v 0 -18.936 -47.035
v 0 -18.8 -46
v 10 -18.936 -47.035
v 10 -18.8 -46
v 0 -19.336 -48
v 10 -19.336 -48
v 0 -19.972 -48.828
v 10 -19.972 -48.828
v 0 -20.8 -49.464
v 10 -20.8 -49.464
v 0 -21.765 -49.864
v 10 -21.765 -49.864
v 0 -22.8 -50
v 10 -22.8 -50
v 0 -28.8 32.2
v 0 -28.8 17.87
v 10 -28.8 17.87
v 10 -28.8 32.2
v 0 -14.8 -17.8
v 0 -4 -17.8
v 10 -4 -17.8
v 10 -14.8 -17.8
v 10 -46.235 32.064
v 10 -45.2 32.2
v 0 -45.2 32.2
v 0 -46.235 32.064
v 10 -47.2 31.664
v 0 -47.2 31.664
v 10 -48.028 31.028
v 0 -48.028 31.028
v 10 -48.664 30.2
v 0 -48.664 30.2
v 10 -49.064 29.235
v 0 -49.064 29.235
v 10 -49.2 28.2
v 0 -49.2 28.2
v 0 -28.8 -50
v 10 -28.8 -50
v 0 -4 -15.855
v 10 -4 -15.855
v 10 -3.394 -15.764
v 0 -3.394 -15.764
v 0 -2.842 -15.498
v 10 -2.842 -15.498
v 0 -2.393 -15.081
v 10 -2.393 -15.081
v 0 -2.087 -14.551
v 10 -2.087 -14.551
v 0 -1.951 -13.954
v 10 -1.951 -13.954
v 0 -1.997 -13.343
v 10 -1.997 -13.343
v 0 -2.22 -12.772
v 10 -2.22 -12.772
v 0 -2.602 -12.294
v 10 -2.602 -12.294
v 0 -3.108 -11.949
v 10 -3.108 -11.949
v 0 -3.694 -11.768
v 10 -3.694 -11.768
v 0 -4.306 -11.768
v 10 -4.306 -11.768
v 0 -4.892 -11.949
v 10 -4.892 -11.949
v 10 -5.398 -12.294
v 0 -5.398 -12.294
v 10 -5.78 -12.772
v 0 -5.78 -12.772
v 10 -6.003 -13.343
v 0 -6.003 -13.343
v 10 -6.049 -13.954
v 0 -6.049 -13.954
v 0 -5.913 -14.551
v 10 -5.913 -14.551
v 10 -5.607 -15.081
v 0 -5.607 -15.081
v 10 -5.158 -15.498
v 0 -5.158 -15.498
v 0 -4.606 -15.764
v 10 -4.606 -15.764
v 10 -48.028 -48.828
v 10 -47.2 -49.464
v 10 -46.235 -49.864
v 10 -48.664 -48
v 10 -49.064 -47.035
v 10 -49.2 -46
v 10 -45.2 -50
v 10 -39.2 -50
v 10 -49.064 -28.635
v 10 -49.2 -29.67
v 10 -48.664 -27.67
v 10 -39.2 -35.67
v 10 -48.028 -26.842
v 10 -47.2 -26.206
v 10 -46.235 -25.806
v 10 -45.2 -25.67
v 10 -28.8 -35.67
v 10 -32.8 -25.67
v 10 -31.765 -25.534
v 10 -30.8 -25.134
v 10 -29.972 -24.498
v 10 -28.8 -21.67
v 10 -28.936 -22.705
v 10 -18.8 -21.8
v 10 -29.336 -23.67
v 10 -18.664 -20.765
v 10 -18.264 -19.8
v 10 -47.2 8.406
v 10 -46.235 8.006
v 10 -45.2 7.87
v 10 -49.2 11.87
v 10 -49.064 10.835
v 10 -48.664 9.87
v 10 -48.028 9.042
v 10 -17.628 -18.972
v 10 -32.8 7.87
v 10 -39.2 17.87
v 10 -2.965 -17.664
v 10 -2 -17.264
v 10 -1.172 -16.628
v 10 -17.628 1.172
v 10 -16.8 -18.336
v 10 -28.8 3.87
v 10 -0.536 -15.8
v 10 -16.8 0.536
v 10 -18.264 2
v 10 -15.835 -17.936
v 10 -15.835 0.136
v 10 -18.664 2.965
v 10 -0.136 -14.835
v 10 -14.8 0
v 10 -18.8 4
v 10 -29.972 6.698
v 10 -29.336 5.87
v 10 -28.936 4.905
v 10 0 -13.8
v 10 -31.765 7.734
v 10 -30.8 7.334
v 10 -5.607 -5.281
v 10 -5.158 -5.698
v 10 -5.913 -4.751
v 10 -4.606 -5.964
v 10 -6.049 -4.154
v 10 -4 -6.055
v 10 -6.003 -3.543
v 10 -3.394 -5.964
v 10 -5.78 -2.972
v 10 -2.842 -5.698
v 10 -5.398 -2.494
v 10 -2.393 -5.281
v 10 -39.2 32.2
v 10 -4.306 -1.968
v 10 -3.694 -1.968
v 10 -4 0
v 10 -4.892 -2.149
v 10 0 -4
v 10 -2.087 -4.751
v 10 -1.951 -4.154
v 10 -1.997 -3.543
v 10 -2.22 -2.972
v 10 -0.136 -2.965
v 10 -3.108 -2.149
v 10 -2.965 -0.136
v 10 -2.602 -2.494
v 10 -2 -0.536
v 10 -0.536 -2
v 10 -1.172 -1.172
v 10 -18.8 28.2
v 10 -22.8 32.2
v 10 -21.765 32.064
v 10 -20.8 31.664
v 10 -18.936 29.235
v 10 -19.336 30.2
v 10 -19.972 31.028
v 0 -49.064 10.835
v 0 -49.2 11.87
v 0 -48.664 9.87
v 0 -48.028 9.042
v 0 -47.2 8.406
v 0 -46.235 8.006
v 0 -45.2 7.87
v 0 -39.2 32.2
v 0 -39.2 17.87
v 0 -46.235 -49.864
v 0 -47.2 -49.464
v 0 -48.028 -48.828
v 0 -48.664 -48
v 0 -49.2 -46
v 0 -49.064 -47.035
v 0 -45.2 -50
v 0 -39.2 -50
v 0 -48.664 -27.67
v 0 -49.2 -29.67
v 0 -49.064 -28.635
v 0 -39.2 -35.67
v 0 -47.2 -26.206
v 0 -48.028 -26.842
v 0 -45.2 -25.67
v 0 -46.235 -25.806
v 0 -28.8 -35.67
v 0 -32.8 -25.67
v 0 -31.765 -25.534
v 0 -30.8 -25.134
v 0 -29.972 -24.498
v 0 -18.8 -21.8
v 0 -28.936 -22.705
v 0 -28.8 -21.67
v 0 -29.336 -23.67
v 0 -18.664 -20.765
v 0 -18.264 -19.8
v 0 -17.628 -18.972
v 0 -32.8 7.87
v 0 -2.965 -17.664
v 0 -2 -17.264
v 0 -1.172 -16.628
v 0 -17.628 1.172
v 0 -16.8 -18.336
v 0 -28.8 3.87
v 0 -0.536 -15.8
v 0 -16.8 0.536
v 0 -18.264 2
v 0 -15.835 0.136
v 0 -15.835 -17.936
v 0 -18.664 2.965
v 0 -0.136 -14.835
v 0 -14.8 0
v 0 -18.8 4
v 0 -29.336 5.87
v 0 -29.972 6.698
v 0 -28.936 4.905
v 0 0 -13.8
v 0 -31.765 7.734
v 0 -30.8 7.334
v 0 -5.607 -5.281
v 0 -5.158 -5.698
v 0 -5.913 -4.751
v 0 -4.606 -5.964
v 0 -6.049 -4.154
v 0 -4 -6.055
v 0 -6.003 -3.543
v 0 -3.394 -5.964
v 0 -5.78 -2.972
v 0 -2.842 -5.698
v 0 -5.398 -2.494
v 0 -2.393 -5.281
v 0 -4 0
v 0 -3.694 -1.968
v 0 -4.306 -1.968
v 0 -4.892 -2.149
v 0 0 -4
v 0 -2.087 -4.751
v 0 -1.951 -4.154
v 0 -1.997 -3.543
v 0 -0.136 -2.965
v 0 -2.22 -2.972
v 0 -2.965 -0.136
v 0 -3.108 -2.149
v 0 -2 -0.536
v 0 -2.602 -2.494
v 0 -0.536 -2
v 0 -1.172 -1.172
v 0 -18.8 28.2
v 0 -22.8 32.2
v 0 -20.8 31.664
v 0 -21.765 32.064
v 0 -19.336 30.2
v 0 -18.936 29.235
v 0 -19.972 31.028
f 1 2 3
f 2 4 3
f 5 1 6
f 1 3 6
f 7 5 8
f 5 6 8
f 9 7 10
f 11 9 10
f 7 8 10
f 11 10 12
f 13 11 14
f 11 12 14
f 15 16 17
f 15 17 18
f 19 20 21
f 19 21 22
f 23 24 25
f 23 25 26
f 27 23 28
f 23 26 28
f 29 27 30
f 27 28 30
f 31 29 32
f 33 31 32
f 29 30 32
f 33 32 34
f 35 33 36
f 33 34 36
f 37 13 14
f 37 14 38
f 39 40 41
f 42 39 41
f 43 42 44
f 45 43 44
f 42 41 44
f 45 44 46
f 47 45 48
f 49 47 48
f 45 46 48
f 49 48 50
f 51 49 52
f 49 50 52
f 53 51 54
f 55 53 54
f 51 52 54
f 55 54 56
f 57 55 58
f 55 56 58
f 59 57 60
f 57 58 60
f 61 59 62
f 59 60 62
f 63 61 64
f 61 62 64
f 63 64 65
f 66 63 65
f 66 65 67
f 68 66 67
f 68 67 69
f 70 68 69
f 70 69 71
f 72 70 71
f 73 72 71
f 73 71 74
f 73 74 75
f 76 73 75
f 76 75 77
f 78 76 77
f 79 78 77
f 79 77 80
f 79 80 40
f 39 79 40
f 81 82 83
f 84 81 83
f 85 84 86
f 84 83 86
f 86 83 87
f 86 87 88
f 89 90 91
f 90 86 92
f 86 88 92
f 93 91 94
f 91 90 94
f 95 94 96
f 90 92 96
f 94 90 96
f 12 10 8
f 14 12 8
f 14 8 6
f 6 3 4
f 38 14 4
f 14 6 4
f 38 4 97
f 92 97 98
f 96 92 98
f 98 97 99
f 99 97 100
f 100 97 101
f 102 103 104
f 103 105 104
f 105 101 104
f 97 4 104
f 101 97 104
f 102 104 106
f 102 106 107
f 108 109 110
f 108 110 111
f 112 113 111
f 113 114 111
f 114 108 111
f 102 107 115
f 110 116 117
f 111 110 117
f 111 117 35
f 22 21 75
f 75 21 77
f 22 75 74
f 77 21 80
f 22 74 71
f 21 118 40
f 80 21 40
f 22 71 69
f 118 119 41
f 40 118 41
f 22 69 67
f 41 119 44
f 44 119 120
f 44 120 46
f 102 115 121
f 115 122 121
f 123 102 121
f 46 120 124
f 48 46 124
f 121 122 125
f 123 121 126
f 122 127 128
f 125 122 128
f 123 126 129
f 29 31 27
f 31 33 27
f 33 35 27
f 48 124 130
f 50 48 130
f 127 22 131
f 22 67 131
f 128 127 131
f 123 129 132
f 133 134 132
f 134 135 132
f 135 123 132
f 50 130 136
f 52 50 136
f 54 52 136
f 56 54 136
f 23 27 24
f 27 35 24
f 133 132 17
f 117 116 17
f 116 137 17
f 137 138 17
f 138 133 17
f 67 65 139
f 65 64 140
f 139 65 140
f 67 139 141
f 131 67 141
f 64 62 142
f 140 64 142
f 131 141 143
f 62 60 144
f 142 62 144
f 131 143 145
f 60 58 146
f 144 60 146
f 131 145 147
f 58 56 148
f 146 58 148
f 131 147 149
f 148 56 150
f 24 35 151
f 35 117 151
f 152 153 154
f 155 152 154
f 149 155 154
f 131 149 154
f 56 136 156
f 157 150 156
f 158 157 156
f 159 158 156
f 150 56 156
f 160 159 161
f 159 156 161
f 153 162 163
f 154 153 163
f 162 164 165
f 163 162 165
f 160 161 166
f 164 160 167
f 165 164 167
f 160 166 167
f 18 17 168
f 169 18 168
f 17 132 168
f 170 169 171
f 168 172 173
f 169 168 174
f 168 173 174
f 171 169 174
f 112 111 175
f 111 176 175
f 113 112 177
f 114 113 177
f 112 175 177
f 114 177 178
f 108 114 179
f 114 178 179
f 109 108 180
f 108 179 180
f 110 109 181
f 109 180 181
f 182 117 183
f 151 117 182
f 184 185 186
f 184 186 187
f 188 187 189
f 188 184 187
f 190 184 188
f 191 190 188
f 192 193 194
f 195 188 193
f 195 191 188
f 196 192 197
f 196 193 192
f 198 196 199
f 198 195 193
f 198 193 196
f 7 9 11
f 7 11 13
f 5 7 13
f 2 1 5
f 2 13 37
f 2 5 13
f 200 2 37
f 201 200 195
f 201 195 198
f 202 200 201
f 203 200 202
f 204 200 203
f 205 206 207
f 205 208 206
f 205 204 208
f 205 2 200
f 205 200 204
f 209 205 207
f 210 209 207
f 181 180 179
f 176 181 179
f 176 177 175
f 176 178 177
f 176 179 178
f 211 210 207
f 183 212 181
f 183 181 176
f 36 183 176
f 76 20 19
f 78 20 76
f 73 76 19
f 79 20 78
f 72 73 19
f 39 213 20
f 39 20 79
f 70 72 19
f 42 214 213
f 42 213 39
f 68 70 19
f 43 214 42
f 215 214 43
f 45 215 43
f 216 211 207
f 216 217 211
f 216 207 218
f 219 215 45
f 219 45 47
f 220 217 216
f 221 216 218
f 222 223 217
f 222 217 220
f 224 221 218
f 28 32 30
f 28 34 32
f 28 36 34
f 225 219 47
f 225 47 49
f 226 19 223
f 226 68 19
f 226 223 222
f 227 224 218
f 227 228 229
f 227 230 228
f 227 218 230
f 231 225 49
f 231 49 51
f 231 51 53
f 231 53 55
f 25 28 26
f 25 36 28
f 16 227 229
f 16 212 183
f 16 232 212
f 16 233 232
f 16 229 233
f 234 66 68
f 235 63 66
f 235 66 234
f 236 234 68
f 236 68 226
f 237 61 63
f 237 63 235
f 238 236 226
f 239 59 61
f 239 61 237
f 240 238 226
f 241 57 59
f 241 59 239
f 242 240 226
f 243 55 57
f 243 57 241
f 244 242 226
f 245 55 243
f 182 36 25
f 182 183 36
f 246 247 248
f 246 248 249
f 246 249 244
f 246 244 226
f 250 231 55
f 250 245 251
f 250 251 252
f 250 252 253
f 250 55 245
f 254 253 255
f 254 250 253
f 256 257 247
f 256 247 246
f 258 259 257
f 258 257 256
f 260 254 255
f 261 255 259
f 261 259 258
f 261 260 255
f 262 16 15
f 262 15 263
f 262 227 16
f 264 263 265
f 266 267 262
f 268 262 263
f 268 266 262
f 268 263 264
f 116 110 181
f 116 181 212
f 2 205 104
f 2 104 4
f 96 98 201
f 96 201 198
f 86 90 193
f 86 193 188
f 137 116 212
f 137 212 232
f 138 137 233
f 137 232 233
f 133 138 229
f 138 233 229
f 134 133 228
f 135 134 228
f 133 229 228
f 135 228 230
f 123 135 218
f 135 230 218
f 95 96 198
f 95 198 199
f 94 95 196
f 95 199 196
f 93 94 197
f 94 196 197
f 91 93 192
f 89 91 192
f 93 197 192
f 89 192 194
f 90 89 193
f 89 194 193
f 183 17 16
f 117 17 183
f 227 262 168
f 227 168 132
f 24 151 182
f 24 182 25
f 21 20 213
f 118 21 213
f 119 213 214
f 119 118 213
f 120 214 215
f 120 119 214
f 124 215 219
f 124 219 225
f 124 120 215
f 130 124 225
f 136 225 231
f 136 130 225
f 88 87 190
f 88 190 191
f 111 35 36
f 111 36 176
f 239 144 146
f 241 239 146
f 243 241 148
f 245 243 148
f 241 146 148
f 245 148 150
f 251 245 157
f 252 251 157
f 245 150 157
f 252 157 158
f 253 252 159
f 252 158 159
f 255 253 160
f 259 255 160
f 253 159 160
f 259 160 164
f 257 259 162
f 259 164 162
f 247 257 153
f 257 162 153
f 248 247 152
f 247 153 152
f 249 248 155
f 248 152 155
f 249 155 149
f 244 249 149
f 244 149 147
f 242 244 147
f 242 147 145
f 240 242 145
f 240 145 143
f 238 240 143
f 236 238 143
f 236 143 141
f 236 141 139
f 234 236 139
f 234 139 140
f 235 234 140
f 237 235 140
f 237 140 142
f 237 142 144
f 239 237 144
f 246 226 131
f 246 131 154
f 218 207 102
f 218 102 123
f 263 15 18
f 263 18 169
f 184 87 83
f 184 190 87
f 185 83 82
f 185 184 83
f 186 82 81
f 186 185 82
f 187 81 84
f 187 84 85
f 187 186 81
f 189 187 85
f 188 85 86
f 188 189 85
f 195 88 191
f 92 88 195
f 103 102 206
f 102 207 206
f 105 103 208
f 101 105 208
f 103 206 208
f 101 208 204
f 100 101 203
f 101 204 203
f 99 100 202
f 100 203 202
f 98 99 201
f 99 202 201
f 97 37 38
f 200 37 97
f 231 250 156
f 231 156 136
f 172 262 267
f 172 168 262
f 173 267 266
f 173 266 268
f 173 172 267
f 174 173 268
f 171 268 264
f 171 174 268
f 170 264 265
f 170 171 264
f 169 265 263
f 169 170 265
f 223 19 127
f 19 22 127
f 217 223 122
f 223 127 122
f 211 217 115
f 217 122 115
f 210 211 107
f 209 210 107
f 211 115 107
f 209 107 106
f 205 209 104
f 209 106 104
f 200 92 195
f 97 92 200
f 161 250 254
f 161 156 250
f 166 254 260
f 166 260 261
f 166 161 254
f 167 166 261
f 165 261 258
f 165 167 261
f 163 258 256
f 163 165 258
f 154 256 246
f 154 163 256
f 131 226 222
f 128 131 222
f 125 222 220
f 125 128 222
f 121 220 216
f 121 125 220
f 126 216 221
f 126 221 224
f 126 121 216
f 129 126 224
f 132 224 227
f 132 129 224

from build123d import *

# Parameters (mm, degrees)
BOSS_EXTRUDE1_DEPTH = 10
SKETCH3_R           = 2.055
CUT_EXTRUDE1_DEPTH  = 11
BOSS_EXTRUDE2_DEPTH = 10
FILLET1_R           = 4
FILLET2_R           = 4


with BuildPart() as part:
    # Sketch1 → Boss-Extrude1 (new body)
    with BuildSketch(Plane(origin=(0, 0, 0), x_dir=(0, 0, -1), z_dir=(1, 0, 0))):
        Polygon((17.8, -18.8), (50, -18.8), (50, -28.8), (-32.2, -28.8), (-32.2, -18.8), (0, -18.8), (0, 0), (17.8, 0), align=None)
    extrude(amount=BOSS_EXTRUDE1_DEPTH)

    # Sketch3 → Cut-Extrude1 (cut, through all)
    with BuildSketch(Plane(origin=(10, 0, 0), x_dir=(0, 0, -1), z_dir=(1, 0, 0))):
        with Locations((4, -4)):
            Circle(SKETCH3_R)
        with Locations((13.8, -4)):
            Circle(SKETCH3_R)
    extrude(amount=-CUT_EXTRUDE1_DEPTH, mode=Mode.SUBTRACT)

    # Sketch4 → Boss-Extrude2 (add)
    with BuildSketch(Plane(origin=(10, 0, 0), x_dir=(0, 0, -1), z_dir=(1, 0, 0))):
        Polygon((-17.87, -28.8), (-17.87, -39.2), (-32.2, -39.2), (-32.2, -49.2), (-7.87, -49.2), (-7.87, -28.8), align=None)
        Polygon((35.67, -28.8), (25.67, -28.8), (25.67, -49.2), (50, -49.2), (50, -39.2), (35.67, -39.2), align=None)
    extrude(amount=-BOSS_EXTRUDE2_DEPTH)

    # Fillet1
    fillet1_edges = [part.edges().sort_by_distance(p)[0] for p in [
        (5, 0, 0),
        (5, 0, -17.8),
    ]]
    fillet(fillet1_edges, radius=FILLET1_R)

    # Fillet2
    fillet2_edges = [part.edges().sort_by_distance(p)[0] for p in [
        (5, -18.8, -17.8),
        (5, -18.8, -50),
        (5, -18.8, 32.2),
        (5, -18.8, 0),
        (5, -49.2, 32.2),
        (5, -49.2, 7.87),
        (5, -28.8, 7.87),
        (5, -28.8, -25.67),
        (5, -49.2, -25.67),
        (5, -49.2, -50),
    ]]
    fillet(fillet2_edges, radius=FILLET2_R)


solid = part.part
